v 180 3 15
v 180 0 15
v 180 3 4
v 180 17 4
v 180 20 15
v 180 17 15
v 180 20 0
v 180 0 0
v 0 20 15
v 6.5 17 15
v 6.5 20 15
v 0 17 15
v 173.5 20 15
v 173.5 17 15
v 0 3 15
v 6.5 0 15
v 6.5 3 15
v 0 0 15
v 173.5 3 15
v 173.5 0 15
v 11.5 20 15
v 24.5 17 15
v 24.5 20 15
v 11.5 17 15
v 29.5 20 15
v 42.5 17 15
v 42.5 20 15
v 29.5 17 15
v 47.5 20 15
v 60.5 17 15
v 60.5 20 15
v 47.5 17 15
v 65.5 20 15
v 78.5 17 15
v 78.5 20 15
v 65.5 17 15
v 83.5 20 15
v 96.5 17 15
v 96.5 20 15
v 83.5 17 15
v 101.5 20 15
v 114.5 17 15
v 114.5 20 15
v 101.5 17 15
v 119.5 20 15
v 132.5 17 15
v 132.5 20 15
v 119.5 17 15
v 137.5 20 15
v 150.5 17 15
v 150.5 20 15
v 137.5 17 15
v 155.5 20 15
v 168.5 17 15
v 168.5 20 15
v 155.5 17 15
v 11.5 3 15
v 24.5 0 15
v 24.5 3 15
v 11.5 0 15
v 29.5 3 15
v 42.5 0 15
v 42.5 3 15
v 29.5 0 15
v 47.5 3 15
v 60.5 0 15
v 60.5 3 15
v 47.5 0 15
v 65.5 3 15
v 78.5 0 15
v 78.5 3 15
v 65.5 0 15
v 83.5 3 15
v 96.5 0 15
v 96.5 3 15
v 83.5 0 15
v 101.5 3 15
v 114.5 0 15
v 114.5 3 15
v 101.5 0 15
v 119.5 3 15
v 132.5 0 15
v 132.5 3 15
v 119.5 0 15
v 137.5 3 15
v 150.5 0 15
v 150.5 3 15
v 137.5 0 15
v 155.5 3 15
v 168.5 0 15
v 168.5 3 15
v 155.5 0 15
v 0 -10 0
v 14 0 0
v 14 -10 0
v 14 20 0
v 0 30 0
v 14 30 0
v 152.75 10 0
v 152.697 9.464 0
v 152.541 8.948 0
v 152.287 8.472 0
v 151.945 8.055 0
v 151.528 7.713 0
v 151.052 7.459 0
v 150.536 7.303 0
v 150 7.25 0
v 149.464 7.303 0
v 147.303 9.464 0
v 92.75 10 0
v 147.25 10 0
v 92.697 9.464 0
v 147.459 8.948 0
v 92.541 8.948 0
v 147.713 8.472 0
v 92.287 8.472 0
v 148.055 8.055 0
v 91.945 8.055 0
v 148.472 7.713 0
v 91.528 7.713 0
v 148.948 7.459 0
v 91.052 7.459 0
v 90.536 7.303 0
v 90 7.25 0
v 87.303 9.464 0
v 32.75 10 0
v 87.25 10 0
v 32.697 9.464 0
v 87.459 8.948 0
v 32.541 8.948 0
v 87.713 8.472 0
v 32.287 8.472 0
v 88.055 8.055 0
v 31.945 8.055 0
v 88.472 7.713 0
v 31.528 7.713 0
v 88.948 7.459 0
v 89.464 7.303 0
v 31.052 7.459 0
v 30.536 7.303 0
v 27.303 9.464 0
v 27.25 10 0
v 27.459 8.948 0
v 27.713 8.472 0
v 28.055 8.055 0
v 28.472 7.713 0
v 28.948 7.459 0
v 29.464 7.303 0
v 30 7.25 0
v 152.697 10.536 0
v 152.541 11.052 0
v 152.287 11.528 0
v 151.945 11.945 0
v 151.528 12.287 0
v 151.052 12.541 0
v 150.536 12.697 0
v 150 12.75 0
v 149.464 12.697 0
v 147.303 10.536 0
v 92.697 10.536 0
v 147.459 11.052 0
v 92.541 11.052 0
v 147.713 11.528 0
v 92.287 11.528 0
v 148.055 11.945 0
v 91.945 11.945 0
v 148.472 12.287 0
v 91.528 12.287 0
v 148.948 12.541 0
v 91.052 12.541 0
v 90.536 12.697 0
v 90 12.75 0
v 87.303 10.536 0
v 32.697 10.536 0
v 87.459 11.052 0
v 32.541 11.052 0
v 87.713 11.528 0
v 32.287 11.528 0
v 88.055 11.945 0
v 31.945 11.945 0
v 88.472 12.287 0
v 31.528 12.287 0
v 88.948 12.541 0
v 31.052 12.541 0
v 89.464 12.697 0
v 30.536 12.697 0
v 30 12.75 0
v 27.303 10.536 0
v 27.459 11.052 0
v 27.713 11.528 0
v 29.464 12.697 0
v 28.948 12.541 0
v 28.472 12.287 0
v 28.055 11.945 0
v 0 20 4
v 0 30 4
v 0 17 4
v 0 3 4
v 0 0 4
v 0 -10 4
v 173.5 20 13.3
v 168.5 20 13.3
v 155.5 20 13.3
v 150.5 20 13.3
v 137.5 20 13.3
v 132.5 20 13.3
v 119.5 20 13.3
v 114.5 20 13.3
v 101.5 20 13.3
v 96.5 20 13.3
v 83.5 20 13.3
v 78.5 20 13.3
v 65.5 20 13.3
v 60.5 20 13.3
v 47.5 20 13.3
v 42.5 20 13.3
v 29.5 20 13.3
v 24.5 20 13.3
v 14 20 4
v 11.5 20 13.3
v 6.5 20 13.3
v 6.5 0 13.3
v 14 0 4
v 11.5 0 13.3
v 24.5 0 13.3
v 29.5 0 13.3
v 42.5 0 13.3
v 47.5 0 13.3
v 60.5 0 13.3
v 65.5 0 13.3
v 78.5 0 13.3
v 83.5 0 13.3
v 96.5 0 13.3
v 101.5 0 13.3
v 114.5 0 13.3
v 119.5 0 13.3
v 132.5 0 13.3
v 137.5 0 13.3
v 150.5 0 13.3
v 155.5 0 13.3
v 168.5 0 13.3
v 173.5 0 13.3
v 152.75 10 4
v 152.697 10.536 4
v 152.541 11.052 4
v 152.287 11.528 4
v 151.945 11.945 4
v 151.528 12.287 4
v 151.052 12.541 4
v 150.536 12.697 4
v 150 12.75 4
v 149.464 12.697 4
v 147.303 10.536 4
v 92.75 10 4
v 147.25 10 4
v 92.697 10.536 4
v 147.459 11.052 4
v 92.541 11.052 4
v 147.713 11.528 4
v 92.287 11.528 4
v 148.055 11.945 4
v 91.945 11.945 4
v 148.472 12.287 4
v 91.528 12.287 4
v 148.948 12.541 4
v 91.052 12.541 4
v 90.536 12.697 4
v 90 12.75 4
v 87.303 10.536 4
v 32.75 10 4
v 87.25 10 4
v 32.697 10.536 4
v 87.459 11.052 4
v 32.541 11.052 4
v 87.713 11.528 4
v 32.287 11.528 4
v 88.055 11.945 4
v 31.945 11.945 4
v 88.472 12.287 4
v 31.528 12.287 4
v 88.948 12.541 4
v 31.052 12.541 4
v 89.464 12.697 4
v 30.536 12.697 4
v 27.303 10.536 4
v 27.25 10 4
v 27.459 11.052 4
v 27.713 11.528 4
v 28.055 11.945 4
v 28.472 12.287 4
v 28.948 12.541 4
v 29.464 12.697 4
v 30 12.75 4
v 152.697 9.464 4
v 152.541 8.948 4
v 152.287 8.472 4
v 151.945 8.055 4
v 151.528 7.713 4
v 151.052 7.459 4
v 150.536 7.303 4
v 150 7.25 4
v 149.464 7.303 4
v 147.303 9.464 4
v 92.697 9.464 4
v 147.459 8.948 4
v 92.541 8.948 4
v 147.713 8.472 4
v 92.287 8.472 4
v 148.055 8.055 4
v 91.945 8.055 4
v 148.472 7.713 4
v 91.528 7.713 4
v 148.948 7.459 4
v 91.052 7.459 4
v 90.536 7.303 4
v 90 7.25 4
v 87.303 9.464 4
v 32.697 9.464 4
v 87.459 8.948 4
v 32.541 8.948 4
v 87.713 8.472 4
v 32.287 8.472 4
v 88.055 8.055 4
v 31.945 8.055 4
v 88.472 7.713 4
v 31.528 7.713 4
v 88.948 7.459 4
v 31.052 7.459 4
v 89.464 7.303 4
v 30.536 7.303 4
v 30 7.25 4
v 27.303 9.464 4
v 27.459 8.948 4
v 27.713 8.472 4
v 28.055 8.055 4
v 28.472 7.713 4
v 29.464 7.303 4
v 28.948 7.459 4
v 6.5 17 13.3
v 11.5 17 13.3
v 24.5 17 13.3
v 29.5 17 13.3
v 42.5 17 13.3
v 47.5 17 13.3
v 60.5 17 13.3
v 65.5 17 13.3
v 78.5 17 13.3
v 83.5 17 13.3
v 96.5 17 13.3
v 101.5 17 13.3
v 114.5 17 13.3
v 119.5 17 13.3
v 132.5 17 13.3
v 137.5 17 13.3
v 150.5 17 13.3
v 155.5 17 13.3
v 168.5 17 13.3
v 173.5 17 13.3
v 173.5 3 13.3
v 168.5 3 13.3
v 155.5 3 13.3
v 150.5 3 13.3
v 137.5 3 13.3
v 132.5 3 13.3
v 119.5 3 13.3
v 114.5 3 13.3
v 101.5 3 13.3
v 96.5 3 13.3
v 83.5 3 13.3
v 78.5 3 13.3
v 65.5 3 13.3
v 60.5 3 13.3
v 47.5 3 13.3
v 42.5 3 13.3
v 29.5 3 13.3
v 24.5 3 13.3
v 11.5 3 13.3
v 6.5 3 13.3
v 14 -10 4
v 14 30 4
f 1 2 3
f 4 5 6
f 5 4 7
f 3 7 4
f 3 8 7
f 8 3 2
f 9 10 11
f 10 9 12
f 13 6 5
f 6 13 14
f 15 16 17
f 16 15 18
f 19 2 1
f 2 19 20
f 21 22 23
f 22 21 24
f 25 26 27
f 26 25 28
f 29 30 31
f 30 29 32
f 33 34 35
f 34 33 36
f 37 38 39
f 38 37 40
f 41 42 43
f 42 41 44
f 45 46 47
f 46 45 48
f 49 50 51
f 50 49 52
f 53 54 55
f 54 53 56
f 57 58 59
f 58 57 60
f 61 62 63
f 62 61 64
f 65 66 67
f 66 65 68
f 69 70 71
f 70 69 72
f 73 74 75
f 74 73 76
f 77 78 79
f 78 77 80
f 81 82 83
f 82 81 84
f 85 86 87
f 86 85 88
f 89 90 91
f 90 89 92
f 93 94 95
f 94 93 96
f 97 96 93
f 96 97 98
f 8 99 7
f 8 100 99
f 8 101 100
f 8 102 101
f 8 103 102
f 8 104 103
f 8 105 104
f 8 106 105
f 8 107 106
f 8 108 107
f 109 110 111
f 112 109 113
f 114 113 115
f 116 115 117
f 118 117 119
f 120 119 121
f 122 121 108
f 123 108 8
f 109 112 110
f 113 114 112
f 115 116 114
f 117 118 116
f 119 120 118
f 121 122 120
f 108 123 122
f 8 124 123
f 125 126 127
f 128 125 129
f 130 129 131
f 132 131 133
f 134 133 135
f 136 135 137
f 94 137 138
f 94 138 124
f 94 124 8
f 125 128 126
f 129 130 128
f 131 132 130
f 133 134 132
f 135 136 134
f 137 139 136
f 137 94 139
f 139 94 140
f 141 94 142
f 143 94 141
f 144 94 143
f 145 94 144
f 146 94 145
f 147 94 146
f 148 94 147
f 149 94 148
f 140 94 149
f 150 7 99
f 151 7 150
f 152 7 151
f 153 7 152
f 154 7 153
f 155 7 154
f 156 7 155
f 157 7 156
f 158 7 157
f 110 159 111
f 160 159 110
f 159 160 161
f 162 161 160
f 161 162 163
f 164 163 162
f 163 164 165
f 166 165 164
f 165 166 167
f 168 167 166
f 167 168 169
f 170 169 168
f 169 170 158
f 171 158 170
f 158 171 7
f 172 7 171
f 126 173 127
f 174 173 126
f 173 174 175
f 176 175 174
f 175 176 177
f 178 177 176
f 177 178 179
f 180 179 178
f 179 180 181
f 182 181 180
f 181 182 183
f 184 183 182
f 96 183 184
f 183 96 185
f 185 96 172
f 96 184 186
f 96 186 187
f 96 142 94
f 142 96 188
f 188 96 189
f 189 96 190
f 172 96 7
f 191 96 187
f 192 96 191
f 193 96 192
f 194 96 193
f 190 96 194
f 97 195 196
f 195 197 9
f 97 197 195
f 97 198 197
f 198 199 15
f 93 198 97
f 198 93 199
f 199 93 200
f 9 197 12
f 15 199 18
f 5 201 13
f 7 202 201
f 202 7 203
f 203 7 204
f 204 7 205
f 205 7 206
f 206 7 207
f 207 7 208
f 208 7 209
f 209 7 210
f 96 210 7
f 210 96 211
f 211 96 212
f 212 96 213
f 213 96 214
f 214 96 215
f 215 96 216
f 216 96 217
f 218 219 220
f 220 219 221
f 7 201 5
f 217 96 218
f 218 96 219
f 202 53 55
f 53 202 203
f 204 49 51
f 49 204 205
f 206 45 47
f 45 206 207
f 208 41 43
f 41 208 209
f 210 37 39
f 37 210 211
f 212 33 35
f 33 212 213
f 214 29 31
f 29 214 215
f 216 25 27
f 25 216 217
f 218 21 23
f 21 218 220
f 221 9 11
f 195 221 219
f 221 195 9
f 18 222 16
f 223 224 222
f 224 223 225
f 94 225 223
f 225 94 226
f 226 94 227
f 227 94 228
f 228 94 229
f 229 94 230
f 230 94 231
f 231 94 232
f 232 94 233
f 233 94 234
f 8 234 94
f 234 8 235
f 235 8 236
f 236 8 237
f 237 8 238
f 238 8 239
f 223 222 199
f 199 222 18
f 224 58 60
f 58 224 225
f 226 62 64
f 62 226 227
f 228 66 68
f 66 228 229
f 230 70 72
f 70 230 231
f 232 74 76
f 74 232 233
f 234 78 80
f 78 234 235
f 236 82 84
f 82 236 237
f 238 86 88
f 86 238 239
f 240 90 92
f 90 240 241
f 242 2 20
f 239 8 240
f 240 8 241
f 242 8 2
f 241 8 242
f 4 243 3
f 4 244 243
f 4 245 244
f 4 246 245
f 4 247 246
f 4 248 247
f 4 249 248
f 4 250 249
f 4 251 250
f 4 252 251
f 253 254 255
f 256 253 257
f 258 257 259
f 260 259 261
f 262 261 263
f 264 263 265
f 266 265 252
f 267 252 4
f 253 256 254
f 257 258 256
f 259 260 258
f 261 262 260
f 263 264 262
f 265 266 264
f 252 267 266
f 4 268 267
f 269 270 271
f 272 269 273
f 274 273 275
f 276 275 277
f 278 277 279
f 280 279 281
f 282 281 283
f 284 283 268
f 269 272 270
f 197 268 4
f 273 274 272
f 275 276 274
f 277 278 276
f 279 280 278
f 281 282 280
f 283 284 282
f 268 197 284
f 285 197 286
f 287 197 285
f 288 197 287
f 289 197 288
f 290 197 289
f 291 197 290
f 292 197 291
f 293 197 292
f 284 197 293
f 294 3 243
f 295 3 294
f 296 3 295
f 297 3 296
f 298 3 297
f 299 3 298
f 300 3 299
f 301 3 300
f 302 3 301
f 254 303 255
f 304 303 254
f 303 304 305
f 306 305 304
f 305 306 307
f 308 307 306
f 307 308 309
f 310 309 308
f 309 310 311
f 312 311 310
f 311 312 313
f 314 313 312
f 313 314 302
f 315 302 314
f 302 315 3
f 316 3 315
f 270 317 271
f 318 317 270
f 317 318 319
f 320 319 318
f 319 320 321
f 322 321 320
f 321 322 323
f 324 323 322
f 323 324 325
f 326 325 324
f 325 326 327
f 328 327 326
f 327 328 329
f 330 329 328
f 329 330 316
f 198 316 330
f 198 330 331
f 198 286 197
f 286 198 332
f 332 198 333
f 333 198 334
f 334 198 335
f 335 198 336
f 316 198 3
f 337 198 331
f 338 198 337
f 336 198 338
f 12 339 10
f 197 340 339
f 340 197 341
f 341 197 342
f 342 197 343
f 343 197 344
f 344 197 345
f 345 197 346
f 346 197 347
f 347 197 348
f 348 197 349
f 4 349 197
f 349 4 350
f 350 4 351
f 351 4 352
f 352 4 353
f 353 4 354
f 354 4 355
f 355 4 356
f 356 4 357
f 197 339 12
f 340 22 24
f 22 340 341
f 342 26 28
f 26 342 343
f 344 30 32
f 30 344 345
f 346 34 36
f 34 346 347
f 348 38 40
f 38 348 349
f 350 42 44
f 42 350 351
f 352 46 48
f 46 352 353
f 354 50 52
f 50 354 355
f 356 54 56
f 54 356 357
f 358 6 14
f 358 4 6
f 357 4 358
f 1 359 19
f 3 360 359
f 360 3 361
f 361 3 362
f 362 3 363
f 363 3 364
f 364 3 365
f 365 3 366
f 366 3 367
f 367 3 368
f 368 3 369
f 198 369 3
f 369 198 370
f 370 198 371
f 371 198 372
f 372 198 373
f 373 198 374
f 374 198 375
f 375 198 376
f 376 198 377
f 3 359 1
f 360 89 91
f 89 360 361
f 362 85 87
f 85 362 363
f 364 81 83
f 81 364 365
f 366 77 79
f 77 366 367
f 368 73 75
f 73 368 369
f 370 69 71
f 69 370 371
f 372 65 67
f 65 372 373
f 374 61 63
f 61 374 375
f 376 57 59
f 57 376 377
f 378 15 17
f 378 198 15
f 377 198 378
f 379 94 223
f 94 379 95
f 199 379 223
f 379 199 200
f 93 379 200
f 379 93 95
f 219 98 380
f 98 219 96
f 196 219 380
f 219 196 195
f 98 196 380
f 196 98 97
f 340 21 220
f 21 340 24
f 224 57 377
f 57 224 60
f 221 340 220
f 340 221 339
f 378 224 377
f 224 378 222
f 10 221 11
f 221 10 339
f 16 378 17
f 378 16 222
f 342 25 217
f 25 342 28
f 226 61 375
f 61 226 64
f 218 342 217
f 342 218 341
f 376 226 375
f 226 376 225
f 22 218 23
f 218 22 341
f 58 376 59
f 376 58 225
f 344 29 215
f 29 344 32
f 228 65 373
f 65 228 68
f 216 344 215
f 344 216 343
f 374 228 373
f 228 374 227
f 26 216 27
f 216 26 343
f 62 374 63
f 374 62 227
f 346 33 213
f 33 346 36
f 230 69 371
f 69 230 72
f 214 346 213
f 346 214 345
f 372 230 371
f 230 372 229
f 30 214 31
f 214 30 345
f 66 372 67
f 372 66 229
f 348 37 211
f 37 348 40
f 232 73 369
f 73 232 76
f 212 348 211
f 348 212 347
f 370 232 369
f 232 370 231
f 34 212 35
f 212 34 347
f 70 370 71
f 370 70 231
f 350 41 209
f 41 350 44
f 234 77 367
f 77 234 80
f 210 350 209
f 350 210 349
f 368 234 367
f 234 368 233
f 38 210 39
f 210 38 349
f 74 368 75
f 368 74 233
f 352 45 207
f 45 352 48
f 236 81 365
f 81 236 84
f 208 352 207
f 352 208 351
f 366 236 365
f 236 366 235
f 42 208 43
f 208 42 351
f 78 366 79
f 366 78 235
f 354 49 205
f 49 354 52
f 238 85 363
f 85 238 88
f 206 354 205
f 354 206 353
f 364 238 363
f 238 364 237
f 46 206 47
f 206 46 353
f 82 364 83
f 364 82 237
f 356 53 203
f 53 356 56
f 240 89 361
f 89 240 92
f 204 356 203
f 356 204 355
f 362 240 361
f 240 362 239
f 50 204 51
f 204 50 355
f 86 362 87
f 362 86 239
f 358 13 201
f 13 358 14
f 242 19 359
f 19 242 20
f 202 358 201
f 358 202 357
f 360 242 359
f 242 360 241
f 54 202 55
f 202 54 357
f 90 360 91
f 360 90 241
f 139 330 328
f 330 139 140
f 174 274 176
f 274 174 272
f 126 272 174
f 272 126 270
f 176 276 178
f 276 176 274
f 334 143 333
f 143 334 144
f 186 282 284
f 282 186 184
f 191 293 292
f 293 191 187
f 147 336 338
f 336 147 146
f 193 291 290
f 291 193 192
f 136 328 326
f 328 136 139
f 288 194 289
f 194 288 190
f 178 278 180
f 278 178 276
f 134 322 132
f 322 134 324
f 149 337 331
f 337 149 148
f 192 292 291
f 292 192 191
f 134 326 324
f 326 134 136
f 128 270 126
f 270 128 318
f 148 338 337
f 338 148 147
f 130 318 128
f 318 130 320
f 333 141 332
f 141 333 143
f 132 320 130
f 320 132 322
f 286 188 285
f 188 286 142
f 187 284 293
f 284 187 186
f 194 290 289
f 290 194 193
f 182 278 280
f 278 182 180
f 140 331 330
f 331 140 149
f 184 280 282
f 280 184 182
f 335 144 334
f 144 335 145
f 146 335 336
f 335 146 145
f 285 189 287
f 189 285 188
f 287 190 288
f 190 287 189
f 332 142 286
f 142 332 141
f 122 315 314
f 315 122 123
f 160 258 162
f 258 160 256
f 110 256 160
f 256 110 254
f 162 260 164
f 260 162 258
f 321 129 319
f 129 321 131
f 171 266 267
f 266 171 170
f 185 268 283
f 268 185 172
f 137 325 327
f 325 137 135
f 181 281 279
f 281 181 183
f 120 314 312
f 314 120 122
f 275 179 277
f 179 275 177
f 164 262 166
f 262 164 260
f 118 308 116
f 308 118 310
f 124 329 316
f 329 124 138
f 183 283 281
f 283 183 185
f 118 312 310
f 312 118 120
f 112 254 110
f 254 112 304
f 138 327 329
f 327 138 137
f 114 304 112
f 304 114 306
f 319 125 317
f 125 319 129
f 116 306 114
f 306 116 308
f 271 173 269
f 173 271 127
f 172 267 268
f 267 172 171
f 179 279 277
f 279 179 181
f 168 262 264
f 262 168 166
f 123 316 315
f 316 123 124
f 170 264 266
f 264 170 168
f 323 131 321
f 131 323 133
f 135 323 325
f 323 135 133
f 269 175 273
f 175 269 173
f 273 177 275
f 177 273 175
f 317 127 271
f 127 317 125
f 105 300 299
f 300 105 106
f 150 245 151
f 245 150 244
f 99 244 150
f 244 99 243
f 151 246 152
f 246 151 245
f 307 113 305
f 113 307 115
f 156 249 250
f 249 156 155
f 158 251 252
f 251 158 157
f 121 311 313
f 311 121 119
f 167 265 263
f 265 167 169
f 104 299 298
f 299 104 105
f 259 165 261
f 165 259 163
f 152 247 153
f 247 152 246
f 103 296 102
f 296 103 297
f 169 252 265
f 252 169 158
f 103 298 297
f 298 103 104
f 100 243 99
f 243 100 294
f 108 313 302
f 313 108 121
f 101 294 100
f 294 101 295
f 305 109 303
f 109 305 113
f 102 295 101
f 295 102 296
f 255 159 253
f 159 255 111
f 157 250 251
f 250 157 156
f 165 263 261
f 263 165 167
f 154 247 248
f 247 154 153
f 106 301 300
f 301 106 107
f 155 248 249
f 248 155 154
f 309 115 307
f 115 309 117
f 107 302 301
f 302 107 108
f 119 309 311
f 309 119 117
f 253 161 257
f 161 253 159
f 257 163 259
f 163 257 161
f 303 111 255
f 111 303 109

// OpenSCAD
$fn = 32;

// ----------------------------------------------------------------------
// Cable duct: 180 x 20 x 15 mm, 10 fingers
// ----------------------------------------------------------------------

// --- parameters (mm) ---
channel_l = 180;          // duct length, X
channel_w = 20;           // duct width, Y
channel_h = 15;           // duct height, Z
channel_t = 3;            // side wall thickness
floor_t = 4;              // floor thickness
slot_w = 5;               // finger slot width
slot_h = 9.3;             // finger slot height
fingers = 10;             // number of finger slots per side
pitch = 18;               // finger pitch
hole_d = 5.5;             // floor mounting hole
hole_n = 3;               // mounting holes in the floor
ear_w = 11;               // mounting ear width
ear_l = 14;               // mounting ear length

module shell() {
  difference() {
    cube([channel_l, channel_w, channel_h]);
    /* open top channel */
    translate([-channel_t - 1, channel_t, floor_t])
      cube([channel_l + 2 * channel_t + 2, channel_w - 2 * channel_t, channel_h + 1]);
  }
}

module ears() {
  translate([0, -ear_w + 1, 0]) cube([ear_l, ear_w, floor_t]);
  translate([0, channel_w - 1, 0]) cube([ear_l, ear_w, floor_t]);
}

difference() {
  union() {
    shell();
    ears();
  }
  /* finger slots cut through both side walls */
  for (i = [0 : fingers - 1]) translate([pitch / 2 + i * pitch - slot_w / 2, -1, floor_t + slot_h]) cube([slot_w, channel_w + 2, channel_h]);
  for (i = [0 : hole_n - 1]) translate([(channel_l / hole_n) * (i + 0.5), channel_w / 2, -1]) cylinder(h = floor_t + 2, d = hole_d);
}
